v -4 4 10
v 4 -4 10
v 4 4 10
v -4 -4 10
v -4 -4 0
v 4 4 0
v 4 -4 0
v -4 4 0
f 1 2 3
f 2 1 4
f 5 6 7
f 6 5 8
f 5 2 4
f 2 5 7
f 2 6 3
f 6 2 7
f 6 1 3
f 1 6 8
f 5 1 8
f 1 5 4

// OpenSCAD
translate([0, 0, 5]) color([0,1,0,0.9]) cube([8, 8, 10], center=true);
